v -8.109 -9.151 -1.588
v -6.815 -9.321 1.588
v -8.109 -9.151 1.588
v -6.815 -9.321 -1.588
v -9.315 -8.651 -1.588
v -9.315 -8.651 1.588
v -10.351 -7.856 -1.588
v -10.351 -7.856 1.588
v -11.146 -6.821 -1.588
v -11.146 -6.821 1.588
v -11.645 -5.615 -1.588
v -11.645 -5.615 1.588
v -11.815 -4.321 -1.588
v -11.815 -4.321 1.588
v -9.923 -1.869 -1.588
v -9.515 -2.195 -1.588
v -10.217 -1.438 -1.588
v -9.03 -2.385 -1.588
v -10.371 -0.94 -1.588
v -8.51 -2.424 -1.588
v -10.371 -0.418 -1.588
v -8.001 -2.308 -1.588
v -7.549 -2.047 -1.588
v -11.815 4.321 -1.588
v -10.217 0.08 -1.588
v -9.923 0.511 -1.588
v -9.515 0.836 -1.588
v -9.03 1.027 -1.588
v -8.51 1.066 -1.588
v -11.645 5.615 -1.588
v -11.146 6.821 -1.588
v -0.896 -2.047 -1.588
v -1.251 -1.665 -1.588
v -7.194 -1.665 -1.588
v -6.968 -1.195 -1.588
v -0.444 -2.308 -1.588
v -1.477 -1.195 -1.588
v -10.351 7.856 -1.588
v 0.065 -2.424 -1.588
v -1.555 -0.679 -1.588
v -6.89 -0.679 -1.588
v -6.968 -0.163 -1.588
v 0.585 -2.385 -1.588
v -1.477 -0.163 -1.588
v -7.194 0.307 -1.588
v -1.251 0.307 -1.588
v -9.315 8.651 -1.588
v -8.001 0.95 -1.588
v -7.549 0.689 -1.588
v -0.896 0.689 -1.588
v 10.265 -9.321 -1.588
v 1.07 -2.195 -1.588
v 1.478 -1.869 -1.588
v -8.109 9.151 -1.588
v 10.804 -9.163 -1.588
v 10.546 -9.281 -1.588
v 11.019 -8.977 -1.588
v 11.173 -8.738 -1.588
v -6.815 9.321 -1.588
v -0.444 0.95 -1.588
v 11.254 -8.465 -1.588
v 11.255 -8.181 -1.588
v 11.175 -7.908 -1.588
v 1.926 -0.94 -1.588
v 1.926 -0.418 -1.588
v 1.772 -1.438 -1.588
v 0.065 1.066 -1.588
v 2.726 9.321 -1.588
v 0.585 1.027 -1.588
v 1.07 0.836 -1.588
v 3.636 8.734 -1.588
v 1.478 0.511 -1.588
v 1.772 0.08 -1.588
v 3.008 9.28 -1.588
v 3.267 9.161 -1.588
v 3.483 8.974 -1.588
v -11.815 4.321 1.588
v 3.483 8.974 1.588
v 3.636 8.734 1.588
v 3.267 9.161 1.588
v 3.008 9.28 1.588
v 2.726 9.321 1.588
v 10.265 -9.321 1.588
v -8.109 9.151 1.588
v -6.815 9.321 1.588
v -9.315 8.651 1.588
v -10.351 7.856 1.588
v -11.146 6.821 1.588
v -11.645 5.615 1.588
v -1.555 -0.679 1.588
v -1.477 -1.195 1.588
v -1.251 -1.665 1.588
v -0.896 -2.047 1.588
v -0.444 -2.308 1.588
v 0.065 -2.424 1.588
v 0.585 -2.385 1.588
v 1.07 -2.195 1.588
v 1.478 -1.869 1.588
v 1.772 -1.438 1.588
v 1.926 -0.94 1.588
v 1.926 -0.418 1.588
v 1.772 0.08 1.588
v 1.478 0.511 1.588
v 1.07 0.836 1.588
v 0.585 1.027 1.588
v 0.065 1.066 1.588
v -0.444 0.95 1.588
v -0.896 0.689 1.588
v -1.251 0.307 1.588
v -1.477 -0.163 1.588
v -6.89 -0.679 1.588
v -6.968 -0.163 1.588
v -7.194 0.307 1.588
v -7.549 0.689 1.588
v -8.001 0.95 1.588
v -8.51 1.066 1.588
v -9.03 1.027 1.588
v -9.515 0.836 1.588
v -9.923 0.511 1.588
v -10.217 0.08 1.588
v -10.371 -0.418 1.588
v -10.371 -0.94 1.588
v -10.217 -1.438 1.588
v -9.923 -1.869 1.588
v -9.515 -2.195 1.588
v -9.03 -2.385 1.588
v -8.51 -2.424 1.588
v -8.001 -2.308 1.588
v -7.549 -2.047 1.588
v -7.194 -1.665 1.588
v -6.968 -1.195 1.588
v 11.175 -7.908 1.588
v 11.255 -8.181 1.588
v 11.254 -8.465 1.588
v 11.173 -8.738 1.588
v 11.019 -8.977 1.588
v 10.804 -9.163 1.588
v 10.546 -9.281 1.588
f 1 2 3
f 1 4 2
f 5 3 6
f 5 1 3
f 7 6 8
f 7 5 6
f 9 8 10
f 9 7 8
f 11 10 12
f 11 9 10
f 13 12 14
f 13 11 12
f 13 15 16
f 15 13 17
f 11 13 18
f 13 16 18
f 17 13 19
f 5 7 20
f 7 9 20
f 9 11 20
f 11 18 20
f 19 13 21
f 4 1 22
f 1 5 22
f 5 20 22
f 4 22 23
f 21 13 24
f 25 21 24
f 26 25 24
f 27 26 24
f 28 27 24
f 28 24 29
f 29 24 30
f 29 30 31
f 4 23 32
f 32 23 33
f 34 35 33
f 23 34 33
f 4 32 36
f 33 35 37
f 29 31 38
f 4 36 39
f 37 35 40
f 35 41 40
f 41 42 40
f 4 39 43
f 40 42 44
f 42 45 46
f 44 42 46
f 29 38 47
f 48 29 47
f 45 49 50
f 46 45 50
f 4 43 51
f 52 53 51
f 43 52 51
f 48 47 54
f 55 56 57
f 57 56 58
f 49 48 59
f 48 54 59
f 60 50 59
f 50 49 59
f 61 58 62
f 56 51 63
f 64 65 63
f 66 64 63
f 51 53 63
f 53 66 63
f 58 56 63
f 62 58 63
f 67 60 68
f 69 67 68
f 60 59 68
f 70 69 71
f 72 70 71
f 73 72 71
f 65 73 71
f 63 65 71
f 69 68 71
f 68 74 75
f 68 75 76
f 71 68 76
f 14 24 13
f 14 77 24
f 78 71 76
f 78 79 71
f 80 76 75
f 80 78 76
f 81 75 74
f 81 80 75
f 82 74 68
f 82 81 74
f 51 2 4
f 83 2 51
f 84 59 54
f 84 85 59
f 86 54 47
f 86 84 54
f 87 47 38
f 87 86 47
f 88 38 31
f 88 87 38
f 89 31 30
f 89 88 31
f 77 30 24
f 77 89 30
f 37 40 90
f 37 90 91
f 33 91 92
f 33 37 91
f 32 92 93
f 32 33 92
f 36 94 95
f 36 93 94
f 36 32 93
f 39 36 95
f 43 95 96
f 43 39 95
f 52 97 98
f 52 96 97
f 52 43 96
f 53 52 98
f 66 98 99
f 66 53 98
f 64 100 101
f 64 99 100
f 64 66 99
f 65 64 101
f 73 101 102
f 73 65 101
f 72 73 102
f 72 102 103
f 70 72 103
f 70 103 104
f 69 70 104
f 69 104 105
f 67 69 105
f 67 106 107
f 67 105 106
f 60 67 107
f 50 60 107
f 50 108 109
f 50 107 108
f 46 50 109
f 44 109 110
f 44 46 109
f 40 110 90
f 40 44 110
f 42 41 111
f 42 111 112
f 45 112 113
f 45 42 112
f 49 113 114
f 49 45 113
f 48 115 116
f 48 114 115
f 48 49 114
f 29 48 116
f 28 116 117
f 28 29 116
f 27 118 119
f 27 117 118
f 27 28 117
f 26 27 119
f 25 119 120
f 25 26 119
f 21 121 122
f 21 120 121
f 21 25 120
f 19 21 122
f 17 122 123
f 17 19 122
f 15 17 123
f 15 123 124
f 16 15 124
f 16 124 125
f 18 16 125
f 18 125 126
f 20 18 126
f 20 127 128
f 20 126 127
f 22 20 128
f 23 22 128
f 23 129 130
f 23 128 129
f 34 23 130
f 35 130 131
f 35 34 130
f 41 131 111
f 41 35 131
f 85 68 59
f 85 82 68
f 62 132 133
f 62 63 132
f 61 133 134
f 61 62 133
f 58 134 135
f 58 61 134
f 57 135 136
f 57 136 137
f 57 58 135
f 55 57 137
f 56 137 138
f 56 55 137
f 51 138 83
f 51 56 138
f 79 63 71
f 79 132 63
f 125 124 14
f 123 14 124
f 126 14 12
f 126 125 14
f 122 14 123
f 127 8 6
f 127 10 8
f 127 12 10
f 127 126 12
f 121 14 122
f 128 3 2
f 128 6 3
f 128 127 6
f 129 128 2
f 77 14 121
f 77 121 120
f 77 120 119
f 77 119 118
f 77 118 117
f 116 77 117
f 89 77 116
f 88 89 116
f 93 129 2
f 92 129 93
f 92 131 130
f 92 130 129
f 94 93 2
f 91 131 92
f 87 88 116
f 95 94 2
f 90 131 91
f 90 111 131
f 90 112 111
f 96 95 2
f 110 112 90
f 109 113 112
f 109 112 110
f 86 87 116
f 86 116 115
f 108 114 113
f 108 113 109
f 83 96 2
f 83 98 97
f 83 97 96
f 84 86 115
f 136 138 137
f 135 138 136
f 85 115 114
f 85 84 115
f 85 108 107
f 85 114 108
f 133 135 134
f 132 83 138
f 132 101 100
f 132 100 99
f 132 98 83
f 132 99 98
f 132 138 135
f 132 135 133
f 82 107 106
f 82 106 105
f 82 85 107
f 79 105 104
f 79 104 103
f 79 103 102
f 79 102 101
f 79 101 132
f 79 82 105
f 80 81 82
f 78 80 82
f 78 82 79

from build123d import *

# Parameters (mm, degrees)
BOSS_EXTRUDE1_DEPTH     = 1.5875
CUT_EXTRUDE1_DEPTH      = 16.380616986
CUT_EXTRUDE1_DEPTH_BACK = 16.380616986
SKETCH2_R               = 1.75
FILLET1_R               = 1
FILLET2_R               = 5


with BuildPart() as part:
    # Sketch1 → Boss-Extrude1 (new, symmetric)
    with BuildSketch(Plane.XY):
        Polygon((11.81540086, -9.32089354), (3.370357256, 9.32089354), (-11.81540086, 9.32089354), (-11.81540086, -9.32089354), align=None)
    extrude(amount=BOSS_EXTRUDE1_DEPTH, both=True)

    # Sketch2 → Cut-Extrude1 (cut, two sides: drawn at the far end of the back side and taken through both)
    with BuildSketch(Plane.XY.offset(1.5875).offset(-CUT_EXTRUDE1_DEPTH_BACK)):
        with Locations(Location((0.195357254, -0.67910646, 0), (0, 0, 180))):
            Circle(SKETCH2_R)
        with Locations((-8.640400858, -0.67910646)):
            Circle(SKETCH2_R)
    extrude(amount=CUT_EXTRUDE1_DEPTH + CUT_EXTRUDE1_DEPTH_BACK, mode=Mode.SUBTRACT)

    # Fillet1
    fillet1_edges = [part.edges().sort_by_distance(p)[0] for p in [
        (3.370357256, 9.32089354, 0),
        (11.81540086, -9.32089354, 0),
    ]]
    fillet(fillet1_edges, radius=FILLET1_R)

    # Fillet2
    fillet2_edges = [part.edges().sort_by_distance(p)[0] for p in [
        (-11.81540086, -9.32089354, 0),
        (-11.81540086, 9.32089354, 0),
    ]]
    fillet(fillet2_edges, radius=FILLET2_R)


solid = part.part
